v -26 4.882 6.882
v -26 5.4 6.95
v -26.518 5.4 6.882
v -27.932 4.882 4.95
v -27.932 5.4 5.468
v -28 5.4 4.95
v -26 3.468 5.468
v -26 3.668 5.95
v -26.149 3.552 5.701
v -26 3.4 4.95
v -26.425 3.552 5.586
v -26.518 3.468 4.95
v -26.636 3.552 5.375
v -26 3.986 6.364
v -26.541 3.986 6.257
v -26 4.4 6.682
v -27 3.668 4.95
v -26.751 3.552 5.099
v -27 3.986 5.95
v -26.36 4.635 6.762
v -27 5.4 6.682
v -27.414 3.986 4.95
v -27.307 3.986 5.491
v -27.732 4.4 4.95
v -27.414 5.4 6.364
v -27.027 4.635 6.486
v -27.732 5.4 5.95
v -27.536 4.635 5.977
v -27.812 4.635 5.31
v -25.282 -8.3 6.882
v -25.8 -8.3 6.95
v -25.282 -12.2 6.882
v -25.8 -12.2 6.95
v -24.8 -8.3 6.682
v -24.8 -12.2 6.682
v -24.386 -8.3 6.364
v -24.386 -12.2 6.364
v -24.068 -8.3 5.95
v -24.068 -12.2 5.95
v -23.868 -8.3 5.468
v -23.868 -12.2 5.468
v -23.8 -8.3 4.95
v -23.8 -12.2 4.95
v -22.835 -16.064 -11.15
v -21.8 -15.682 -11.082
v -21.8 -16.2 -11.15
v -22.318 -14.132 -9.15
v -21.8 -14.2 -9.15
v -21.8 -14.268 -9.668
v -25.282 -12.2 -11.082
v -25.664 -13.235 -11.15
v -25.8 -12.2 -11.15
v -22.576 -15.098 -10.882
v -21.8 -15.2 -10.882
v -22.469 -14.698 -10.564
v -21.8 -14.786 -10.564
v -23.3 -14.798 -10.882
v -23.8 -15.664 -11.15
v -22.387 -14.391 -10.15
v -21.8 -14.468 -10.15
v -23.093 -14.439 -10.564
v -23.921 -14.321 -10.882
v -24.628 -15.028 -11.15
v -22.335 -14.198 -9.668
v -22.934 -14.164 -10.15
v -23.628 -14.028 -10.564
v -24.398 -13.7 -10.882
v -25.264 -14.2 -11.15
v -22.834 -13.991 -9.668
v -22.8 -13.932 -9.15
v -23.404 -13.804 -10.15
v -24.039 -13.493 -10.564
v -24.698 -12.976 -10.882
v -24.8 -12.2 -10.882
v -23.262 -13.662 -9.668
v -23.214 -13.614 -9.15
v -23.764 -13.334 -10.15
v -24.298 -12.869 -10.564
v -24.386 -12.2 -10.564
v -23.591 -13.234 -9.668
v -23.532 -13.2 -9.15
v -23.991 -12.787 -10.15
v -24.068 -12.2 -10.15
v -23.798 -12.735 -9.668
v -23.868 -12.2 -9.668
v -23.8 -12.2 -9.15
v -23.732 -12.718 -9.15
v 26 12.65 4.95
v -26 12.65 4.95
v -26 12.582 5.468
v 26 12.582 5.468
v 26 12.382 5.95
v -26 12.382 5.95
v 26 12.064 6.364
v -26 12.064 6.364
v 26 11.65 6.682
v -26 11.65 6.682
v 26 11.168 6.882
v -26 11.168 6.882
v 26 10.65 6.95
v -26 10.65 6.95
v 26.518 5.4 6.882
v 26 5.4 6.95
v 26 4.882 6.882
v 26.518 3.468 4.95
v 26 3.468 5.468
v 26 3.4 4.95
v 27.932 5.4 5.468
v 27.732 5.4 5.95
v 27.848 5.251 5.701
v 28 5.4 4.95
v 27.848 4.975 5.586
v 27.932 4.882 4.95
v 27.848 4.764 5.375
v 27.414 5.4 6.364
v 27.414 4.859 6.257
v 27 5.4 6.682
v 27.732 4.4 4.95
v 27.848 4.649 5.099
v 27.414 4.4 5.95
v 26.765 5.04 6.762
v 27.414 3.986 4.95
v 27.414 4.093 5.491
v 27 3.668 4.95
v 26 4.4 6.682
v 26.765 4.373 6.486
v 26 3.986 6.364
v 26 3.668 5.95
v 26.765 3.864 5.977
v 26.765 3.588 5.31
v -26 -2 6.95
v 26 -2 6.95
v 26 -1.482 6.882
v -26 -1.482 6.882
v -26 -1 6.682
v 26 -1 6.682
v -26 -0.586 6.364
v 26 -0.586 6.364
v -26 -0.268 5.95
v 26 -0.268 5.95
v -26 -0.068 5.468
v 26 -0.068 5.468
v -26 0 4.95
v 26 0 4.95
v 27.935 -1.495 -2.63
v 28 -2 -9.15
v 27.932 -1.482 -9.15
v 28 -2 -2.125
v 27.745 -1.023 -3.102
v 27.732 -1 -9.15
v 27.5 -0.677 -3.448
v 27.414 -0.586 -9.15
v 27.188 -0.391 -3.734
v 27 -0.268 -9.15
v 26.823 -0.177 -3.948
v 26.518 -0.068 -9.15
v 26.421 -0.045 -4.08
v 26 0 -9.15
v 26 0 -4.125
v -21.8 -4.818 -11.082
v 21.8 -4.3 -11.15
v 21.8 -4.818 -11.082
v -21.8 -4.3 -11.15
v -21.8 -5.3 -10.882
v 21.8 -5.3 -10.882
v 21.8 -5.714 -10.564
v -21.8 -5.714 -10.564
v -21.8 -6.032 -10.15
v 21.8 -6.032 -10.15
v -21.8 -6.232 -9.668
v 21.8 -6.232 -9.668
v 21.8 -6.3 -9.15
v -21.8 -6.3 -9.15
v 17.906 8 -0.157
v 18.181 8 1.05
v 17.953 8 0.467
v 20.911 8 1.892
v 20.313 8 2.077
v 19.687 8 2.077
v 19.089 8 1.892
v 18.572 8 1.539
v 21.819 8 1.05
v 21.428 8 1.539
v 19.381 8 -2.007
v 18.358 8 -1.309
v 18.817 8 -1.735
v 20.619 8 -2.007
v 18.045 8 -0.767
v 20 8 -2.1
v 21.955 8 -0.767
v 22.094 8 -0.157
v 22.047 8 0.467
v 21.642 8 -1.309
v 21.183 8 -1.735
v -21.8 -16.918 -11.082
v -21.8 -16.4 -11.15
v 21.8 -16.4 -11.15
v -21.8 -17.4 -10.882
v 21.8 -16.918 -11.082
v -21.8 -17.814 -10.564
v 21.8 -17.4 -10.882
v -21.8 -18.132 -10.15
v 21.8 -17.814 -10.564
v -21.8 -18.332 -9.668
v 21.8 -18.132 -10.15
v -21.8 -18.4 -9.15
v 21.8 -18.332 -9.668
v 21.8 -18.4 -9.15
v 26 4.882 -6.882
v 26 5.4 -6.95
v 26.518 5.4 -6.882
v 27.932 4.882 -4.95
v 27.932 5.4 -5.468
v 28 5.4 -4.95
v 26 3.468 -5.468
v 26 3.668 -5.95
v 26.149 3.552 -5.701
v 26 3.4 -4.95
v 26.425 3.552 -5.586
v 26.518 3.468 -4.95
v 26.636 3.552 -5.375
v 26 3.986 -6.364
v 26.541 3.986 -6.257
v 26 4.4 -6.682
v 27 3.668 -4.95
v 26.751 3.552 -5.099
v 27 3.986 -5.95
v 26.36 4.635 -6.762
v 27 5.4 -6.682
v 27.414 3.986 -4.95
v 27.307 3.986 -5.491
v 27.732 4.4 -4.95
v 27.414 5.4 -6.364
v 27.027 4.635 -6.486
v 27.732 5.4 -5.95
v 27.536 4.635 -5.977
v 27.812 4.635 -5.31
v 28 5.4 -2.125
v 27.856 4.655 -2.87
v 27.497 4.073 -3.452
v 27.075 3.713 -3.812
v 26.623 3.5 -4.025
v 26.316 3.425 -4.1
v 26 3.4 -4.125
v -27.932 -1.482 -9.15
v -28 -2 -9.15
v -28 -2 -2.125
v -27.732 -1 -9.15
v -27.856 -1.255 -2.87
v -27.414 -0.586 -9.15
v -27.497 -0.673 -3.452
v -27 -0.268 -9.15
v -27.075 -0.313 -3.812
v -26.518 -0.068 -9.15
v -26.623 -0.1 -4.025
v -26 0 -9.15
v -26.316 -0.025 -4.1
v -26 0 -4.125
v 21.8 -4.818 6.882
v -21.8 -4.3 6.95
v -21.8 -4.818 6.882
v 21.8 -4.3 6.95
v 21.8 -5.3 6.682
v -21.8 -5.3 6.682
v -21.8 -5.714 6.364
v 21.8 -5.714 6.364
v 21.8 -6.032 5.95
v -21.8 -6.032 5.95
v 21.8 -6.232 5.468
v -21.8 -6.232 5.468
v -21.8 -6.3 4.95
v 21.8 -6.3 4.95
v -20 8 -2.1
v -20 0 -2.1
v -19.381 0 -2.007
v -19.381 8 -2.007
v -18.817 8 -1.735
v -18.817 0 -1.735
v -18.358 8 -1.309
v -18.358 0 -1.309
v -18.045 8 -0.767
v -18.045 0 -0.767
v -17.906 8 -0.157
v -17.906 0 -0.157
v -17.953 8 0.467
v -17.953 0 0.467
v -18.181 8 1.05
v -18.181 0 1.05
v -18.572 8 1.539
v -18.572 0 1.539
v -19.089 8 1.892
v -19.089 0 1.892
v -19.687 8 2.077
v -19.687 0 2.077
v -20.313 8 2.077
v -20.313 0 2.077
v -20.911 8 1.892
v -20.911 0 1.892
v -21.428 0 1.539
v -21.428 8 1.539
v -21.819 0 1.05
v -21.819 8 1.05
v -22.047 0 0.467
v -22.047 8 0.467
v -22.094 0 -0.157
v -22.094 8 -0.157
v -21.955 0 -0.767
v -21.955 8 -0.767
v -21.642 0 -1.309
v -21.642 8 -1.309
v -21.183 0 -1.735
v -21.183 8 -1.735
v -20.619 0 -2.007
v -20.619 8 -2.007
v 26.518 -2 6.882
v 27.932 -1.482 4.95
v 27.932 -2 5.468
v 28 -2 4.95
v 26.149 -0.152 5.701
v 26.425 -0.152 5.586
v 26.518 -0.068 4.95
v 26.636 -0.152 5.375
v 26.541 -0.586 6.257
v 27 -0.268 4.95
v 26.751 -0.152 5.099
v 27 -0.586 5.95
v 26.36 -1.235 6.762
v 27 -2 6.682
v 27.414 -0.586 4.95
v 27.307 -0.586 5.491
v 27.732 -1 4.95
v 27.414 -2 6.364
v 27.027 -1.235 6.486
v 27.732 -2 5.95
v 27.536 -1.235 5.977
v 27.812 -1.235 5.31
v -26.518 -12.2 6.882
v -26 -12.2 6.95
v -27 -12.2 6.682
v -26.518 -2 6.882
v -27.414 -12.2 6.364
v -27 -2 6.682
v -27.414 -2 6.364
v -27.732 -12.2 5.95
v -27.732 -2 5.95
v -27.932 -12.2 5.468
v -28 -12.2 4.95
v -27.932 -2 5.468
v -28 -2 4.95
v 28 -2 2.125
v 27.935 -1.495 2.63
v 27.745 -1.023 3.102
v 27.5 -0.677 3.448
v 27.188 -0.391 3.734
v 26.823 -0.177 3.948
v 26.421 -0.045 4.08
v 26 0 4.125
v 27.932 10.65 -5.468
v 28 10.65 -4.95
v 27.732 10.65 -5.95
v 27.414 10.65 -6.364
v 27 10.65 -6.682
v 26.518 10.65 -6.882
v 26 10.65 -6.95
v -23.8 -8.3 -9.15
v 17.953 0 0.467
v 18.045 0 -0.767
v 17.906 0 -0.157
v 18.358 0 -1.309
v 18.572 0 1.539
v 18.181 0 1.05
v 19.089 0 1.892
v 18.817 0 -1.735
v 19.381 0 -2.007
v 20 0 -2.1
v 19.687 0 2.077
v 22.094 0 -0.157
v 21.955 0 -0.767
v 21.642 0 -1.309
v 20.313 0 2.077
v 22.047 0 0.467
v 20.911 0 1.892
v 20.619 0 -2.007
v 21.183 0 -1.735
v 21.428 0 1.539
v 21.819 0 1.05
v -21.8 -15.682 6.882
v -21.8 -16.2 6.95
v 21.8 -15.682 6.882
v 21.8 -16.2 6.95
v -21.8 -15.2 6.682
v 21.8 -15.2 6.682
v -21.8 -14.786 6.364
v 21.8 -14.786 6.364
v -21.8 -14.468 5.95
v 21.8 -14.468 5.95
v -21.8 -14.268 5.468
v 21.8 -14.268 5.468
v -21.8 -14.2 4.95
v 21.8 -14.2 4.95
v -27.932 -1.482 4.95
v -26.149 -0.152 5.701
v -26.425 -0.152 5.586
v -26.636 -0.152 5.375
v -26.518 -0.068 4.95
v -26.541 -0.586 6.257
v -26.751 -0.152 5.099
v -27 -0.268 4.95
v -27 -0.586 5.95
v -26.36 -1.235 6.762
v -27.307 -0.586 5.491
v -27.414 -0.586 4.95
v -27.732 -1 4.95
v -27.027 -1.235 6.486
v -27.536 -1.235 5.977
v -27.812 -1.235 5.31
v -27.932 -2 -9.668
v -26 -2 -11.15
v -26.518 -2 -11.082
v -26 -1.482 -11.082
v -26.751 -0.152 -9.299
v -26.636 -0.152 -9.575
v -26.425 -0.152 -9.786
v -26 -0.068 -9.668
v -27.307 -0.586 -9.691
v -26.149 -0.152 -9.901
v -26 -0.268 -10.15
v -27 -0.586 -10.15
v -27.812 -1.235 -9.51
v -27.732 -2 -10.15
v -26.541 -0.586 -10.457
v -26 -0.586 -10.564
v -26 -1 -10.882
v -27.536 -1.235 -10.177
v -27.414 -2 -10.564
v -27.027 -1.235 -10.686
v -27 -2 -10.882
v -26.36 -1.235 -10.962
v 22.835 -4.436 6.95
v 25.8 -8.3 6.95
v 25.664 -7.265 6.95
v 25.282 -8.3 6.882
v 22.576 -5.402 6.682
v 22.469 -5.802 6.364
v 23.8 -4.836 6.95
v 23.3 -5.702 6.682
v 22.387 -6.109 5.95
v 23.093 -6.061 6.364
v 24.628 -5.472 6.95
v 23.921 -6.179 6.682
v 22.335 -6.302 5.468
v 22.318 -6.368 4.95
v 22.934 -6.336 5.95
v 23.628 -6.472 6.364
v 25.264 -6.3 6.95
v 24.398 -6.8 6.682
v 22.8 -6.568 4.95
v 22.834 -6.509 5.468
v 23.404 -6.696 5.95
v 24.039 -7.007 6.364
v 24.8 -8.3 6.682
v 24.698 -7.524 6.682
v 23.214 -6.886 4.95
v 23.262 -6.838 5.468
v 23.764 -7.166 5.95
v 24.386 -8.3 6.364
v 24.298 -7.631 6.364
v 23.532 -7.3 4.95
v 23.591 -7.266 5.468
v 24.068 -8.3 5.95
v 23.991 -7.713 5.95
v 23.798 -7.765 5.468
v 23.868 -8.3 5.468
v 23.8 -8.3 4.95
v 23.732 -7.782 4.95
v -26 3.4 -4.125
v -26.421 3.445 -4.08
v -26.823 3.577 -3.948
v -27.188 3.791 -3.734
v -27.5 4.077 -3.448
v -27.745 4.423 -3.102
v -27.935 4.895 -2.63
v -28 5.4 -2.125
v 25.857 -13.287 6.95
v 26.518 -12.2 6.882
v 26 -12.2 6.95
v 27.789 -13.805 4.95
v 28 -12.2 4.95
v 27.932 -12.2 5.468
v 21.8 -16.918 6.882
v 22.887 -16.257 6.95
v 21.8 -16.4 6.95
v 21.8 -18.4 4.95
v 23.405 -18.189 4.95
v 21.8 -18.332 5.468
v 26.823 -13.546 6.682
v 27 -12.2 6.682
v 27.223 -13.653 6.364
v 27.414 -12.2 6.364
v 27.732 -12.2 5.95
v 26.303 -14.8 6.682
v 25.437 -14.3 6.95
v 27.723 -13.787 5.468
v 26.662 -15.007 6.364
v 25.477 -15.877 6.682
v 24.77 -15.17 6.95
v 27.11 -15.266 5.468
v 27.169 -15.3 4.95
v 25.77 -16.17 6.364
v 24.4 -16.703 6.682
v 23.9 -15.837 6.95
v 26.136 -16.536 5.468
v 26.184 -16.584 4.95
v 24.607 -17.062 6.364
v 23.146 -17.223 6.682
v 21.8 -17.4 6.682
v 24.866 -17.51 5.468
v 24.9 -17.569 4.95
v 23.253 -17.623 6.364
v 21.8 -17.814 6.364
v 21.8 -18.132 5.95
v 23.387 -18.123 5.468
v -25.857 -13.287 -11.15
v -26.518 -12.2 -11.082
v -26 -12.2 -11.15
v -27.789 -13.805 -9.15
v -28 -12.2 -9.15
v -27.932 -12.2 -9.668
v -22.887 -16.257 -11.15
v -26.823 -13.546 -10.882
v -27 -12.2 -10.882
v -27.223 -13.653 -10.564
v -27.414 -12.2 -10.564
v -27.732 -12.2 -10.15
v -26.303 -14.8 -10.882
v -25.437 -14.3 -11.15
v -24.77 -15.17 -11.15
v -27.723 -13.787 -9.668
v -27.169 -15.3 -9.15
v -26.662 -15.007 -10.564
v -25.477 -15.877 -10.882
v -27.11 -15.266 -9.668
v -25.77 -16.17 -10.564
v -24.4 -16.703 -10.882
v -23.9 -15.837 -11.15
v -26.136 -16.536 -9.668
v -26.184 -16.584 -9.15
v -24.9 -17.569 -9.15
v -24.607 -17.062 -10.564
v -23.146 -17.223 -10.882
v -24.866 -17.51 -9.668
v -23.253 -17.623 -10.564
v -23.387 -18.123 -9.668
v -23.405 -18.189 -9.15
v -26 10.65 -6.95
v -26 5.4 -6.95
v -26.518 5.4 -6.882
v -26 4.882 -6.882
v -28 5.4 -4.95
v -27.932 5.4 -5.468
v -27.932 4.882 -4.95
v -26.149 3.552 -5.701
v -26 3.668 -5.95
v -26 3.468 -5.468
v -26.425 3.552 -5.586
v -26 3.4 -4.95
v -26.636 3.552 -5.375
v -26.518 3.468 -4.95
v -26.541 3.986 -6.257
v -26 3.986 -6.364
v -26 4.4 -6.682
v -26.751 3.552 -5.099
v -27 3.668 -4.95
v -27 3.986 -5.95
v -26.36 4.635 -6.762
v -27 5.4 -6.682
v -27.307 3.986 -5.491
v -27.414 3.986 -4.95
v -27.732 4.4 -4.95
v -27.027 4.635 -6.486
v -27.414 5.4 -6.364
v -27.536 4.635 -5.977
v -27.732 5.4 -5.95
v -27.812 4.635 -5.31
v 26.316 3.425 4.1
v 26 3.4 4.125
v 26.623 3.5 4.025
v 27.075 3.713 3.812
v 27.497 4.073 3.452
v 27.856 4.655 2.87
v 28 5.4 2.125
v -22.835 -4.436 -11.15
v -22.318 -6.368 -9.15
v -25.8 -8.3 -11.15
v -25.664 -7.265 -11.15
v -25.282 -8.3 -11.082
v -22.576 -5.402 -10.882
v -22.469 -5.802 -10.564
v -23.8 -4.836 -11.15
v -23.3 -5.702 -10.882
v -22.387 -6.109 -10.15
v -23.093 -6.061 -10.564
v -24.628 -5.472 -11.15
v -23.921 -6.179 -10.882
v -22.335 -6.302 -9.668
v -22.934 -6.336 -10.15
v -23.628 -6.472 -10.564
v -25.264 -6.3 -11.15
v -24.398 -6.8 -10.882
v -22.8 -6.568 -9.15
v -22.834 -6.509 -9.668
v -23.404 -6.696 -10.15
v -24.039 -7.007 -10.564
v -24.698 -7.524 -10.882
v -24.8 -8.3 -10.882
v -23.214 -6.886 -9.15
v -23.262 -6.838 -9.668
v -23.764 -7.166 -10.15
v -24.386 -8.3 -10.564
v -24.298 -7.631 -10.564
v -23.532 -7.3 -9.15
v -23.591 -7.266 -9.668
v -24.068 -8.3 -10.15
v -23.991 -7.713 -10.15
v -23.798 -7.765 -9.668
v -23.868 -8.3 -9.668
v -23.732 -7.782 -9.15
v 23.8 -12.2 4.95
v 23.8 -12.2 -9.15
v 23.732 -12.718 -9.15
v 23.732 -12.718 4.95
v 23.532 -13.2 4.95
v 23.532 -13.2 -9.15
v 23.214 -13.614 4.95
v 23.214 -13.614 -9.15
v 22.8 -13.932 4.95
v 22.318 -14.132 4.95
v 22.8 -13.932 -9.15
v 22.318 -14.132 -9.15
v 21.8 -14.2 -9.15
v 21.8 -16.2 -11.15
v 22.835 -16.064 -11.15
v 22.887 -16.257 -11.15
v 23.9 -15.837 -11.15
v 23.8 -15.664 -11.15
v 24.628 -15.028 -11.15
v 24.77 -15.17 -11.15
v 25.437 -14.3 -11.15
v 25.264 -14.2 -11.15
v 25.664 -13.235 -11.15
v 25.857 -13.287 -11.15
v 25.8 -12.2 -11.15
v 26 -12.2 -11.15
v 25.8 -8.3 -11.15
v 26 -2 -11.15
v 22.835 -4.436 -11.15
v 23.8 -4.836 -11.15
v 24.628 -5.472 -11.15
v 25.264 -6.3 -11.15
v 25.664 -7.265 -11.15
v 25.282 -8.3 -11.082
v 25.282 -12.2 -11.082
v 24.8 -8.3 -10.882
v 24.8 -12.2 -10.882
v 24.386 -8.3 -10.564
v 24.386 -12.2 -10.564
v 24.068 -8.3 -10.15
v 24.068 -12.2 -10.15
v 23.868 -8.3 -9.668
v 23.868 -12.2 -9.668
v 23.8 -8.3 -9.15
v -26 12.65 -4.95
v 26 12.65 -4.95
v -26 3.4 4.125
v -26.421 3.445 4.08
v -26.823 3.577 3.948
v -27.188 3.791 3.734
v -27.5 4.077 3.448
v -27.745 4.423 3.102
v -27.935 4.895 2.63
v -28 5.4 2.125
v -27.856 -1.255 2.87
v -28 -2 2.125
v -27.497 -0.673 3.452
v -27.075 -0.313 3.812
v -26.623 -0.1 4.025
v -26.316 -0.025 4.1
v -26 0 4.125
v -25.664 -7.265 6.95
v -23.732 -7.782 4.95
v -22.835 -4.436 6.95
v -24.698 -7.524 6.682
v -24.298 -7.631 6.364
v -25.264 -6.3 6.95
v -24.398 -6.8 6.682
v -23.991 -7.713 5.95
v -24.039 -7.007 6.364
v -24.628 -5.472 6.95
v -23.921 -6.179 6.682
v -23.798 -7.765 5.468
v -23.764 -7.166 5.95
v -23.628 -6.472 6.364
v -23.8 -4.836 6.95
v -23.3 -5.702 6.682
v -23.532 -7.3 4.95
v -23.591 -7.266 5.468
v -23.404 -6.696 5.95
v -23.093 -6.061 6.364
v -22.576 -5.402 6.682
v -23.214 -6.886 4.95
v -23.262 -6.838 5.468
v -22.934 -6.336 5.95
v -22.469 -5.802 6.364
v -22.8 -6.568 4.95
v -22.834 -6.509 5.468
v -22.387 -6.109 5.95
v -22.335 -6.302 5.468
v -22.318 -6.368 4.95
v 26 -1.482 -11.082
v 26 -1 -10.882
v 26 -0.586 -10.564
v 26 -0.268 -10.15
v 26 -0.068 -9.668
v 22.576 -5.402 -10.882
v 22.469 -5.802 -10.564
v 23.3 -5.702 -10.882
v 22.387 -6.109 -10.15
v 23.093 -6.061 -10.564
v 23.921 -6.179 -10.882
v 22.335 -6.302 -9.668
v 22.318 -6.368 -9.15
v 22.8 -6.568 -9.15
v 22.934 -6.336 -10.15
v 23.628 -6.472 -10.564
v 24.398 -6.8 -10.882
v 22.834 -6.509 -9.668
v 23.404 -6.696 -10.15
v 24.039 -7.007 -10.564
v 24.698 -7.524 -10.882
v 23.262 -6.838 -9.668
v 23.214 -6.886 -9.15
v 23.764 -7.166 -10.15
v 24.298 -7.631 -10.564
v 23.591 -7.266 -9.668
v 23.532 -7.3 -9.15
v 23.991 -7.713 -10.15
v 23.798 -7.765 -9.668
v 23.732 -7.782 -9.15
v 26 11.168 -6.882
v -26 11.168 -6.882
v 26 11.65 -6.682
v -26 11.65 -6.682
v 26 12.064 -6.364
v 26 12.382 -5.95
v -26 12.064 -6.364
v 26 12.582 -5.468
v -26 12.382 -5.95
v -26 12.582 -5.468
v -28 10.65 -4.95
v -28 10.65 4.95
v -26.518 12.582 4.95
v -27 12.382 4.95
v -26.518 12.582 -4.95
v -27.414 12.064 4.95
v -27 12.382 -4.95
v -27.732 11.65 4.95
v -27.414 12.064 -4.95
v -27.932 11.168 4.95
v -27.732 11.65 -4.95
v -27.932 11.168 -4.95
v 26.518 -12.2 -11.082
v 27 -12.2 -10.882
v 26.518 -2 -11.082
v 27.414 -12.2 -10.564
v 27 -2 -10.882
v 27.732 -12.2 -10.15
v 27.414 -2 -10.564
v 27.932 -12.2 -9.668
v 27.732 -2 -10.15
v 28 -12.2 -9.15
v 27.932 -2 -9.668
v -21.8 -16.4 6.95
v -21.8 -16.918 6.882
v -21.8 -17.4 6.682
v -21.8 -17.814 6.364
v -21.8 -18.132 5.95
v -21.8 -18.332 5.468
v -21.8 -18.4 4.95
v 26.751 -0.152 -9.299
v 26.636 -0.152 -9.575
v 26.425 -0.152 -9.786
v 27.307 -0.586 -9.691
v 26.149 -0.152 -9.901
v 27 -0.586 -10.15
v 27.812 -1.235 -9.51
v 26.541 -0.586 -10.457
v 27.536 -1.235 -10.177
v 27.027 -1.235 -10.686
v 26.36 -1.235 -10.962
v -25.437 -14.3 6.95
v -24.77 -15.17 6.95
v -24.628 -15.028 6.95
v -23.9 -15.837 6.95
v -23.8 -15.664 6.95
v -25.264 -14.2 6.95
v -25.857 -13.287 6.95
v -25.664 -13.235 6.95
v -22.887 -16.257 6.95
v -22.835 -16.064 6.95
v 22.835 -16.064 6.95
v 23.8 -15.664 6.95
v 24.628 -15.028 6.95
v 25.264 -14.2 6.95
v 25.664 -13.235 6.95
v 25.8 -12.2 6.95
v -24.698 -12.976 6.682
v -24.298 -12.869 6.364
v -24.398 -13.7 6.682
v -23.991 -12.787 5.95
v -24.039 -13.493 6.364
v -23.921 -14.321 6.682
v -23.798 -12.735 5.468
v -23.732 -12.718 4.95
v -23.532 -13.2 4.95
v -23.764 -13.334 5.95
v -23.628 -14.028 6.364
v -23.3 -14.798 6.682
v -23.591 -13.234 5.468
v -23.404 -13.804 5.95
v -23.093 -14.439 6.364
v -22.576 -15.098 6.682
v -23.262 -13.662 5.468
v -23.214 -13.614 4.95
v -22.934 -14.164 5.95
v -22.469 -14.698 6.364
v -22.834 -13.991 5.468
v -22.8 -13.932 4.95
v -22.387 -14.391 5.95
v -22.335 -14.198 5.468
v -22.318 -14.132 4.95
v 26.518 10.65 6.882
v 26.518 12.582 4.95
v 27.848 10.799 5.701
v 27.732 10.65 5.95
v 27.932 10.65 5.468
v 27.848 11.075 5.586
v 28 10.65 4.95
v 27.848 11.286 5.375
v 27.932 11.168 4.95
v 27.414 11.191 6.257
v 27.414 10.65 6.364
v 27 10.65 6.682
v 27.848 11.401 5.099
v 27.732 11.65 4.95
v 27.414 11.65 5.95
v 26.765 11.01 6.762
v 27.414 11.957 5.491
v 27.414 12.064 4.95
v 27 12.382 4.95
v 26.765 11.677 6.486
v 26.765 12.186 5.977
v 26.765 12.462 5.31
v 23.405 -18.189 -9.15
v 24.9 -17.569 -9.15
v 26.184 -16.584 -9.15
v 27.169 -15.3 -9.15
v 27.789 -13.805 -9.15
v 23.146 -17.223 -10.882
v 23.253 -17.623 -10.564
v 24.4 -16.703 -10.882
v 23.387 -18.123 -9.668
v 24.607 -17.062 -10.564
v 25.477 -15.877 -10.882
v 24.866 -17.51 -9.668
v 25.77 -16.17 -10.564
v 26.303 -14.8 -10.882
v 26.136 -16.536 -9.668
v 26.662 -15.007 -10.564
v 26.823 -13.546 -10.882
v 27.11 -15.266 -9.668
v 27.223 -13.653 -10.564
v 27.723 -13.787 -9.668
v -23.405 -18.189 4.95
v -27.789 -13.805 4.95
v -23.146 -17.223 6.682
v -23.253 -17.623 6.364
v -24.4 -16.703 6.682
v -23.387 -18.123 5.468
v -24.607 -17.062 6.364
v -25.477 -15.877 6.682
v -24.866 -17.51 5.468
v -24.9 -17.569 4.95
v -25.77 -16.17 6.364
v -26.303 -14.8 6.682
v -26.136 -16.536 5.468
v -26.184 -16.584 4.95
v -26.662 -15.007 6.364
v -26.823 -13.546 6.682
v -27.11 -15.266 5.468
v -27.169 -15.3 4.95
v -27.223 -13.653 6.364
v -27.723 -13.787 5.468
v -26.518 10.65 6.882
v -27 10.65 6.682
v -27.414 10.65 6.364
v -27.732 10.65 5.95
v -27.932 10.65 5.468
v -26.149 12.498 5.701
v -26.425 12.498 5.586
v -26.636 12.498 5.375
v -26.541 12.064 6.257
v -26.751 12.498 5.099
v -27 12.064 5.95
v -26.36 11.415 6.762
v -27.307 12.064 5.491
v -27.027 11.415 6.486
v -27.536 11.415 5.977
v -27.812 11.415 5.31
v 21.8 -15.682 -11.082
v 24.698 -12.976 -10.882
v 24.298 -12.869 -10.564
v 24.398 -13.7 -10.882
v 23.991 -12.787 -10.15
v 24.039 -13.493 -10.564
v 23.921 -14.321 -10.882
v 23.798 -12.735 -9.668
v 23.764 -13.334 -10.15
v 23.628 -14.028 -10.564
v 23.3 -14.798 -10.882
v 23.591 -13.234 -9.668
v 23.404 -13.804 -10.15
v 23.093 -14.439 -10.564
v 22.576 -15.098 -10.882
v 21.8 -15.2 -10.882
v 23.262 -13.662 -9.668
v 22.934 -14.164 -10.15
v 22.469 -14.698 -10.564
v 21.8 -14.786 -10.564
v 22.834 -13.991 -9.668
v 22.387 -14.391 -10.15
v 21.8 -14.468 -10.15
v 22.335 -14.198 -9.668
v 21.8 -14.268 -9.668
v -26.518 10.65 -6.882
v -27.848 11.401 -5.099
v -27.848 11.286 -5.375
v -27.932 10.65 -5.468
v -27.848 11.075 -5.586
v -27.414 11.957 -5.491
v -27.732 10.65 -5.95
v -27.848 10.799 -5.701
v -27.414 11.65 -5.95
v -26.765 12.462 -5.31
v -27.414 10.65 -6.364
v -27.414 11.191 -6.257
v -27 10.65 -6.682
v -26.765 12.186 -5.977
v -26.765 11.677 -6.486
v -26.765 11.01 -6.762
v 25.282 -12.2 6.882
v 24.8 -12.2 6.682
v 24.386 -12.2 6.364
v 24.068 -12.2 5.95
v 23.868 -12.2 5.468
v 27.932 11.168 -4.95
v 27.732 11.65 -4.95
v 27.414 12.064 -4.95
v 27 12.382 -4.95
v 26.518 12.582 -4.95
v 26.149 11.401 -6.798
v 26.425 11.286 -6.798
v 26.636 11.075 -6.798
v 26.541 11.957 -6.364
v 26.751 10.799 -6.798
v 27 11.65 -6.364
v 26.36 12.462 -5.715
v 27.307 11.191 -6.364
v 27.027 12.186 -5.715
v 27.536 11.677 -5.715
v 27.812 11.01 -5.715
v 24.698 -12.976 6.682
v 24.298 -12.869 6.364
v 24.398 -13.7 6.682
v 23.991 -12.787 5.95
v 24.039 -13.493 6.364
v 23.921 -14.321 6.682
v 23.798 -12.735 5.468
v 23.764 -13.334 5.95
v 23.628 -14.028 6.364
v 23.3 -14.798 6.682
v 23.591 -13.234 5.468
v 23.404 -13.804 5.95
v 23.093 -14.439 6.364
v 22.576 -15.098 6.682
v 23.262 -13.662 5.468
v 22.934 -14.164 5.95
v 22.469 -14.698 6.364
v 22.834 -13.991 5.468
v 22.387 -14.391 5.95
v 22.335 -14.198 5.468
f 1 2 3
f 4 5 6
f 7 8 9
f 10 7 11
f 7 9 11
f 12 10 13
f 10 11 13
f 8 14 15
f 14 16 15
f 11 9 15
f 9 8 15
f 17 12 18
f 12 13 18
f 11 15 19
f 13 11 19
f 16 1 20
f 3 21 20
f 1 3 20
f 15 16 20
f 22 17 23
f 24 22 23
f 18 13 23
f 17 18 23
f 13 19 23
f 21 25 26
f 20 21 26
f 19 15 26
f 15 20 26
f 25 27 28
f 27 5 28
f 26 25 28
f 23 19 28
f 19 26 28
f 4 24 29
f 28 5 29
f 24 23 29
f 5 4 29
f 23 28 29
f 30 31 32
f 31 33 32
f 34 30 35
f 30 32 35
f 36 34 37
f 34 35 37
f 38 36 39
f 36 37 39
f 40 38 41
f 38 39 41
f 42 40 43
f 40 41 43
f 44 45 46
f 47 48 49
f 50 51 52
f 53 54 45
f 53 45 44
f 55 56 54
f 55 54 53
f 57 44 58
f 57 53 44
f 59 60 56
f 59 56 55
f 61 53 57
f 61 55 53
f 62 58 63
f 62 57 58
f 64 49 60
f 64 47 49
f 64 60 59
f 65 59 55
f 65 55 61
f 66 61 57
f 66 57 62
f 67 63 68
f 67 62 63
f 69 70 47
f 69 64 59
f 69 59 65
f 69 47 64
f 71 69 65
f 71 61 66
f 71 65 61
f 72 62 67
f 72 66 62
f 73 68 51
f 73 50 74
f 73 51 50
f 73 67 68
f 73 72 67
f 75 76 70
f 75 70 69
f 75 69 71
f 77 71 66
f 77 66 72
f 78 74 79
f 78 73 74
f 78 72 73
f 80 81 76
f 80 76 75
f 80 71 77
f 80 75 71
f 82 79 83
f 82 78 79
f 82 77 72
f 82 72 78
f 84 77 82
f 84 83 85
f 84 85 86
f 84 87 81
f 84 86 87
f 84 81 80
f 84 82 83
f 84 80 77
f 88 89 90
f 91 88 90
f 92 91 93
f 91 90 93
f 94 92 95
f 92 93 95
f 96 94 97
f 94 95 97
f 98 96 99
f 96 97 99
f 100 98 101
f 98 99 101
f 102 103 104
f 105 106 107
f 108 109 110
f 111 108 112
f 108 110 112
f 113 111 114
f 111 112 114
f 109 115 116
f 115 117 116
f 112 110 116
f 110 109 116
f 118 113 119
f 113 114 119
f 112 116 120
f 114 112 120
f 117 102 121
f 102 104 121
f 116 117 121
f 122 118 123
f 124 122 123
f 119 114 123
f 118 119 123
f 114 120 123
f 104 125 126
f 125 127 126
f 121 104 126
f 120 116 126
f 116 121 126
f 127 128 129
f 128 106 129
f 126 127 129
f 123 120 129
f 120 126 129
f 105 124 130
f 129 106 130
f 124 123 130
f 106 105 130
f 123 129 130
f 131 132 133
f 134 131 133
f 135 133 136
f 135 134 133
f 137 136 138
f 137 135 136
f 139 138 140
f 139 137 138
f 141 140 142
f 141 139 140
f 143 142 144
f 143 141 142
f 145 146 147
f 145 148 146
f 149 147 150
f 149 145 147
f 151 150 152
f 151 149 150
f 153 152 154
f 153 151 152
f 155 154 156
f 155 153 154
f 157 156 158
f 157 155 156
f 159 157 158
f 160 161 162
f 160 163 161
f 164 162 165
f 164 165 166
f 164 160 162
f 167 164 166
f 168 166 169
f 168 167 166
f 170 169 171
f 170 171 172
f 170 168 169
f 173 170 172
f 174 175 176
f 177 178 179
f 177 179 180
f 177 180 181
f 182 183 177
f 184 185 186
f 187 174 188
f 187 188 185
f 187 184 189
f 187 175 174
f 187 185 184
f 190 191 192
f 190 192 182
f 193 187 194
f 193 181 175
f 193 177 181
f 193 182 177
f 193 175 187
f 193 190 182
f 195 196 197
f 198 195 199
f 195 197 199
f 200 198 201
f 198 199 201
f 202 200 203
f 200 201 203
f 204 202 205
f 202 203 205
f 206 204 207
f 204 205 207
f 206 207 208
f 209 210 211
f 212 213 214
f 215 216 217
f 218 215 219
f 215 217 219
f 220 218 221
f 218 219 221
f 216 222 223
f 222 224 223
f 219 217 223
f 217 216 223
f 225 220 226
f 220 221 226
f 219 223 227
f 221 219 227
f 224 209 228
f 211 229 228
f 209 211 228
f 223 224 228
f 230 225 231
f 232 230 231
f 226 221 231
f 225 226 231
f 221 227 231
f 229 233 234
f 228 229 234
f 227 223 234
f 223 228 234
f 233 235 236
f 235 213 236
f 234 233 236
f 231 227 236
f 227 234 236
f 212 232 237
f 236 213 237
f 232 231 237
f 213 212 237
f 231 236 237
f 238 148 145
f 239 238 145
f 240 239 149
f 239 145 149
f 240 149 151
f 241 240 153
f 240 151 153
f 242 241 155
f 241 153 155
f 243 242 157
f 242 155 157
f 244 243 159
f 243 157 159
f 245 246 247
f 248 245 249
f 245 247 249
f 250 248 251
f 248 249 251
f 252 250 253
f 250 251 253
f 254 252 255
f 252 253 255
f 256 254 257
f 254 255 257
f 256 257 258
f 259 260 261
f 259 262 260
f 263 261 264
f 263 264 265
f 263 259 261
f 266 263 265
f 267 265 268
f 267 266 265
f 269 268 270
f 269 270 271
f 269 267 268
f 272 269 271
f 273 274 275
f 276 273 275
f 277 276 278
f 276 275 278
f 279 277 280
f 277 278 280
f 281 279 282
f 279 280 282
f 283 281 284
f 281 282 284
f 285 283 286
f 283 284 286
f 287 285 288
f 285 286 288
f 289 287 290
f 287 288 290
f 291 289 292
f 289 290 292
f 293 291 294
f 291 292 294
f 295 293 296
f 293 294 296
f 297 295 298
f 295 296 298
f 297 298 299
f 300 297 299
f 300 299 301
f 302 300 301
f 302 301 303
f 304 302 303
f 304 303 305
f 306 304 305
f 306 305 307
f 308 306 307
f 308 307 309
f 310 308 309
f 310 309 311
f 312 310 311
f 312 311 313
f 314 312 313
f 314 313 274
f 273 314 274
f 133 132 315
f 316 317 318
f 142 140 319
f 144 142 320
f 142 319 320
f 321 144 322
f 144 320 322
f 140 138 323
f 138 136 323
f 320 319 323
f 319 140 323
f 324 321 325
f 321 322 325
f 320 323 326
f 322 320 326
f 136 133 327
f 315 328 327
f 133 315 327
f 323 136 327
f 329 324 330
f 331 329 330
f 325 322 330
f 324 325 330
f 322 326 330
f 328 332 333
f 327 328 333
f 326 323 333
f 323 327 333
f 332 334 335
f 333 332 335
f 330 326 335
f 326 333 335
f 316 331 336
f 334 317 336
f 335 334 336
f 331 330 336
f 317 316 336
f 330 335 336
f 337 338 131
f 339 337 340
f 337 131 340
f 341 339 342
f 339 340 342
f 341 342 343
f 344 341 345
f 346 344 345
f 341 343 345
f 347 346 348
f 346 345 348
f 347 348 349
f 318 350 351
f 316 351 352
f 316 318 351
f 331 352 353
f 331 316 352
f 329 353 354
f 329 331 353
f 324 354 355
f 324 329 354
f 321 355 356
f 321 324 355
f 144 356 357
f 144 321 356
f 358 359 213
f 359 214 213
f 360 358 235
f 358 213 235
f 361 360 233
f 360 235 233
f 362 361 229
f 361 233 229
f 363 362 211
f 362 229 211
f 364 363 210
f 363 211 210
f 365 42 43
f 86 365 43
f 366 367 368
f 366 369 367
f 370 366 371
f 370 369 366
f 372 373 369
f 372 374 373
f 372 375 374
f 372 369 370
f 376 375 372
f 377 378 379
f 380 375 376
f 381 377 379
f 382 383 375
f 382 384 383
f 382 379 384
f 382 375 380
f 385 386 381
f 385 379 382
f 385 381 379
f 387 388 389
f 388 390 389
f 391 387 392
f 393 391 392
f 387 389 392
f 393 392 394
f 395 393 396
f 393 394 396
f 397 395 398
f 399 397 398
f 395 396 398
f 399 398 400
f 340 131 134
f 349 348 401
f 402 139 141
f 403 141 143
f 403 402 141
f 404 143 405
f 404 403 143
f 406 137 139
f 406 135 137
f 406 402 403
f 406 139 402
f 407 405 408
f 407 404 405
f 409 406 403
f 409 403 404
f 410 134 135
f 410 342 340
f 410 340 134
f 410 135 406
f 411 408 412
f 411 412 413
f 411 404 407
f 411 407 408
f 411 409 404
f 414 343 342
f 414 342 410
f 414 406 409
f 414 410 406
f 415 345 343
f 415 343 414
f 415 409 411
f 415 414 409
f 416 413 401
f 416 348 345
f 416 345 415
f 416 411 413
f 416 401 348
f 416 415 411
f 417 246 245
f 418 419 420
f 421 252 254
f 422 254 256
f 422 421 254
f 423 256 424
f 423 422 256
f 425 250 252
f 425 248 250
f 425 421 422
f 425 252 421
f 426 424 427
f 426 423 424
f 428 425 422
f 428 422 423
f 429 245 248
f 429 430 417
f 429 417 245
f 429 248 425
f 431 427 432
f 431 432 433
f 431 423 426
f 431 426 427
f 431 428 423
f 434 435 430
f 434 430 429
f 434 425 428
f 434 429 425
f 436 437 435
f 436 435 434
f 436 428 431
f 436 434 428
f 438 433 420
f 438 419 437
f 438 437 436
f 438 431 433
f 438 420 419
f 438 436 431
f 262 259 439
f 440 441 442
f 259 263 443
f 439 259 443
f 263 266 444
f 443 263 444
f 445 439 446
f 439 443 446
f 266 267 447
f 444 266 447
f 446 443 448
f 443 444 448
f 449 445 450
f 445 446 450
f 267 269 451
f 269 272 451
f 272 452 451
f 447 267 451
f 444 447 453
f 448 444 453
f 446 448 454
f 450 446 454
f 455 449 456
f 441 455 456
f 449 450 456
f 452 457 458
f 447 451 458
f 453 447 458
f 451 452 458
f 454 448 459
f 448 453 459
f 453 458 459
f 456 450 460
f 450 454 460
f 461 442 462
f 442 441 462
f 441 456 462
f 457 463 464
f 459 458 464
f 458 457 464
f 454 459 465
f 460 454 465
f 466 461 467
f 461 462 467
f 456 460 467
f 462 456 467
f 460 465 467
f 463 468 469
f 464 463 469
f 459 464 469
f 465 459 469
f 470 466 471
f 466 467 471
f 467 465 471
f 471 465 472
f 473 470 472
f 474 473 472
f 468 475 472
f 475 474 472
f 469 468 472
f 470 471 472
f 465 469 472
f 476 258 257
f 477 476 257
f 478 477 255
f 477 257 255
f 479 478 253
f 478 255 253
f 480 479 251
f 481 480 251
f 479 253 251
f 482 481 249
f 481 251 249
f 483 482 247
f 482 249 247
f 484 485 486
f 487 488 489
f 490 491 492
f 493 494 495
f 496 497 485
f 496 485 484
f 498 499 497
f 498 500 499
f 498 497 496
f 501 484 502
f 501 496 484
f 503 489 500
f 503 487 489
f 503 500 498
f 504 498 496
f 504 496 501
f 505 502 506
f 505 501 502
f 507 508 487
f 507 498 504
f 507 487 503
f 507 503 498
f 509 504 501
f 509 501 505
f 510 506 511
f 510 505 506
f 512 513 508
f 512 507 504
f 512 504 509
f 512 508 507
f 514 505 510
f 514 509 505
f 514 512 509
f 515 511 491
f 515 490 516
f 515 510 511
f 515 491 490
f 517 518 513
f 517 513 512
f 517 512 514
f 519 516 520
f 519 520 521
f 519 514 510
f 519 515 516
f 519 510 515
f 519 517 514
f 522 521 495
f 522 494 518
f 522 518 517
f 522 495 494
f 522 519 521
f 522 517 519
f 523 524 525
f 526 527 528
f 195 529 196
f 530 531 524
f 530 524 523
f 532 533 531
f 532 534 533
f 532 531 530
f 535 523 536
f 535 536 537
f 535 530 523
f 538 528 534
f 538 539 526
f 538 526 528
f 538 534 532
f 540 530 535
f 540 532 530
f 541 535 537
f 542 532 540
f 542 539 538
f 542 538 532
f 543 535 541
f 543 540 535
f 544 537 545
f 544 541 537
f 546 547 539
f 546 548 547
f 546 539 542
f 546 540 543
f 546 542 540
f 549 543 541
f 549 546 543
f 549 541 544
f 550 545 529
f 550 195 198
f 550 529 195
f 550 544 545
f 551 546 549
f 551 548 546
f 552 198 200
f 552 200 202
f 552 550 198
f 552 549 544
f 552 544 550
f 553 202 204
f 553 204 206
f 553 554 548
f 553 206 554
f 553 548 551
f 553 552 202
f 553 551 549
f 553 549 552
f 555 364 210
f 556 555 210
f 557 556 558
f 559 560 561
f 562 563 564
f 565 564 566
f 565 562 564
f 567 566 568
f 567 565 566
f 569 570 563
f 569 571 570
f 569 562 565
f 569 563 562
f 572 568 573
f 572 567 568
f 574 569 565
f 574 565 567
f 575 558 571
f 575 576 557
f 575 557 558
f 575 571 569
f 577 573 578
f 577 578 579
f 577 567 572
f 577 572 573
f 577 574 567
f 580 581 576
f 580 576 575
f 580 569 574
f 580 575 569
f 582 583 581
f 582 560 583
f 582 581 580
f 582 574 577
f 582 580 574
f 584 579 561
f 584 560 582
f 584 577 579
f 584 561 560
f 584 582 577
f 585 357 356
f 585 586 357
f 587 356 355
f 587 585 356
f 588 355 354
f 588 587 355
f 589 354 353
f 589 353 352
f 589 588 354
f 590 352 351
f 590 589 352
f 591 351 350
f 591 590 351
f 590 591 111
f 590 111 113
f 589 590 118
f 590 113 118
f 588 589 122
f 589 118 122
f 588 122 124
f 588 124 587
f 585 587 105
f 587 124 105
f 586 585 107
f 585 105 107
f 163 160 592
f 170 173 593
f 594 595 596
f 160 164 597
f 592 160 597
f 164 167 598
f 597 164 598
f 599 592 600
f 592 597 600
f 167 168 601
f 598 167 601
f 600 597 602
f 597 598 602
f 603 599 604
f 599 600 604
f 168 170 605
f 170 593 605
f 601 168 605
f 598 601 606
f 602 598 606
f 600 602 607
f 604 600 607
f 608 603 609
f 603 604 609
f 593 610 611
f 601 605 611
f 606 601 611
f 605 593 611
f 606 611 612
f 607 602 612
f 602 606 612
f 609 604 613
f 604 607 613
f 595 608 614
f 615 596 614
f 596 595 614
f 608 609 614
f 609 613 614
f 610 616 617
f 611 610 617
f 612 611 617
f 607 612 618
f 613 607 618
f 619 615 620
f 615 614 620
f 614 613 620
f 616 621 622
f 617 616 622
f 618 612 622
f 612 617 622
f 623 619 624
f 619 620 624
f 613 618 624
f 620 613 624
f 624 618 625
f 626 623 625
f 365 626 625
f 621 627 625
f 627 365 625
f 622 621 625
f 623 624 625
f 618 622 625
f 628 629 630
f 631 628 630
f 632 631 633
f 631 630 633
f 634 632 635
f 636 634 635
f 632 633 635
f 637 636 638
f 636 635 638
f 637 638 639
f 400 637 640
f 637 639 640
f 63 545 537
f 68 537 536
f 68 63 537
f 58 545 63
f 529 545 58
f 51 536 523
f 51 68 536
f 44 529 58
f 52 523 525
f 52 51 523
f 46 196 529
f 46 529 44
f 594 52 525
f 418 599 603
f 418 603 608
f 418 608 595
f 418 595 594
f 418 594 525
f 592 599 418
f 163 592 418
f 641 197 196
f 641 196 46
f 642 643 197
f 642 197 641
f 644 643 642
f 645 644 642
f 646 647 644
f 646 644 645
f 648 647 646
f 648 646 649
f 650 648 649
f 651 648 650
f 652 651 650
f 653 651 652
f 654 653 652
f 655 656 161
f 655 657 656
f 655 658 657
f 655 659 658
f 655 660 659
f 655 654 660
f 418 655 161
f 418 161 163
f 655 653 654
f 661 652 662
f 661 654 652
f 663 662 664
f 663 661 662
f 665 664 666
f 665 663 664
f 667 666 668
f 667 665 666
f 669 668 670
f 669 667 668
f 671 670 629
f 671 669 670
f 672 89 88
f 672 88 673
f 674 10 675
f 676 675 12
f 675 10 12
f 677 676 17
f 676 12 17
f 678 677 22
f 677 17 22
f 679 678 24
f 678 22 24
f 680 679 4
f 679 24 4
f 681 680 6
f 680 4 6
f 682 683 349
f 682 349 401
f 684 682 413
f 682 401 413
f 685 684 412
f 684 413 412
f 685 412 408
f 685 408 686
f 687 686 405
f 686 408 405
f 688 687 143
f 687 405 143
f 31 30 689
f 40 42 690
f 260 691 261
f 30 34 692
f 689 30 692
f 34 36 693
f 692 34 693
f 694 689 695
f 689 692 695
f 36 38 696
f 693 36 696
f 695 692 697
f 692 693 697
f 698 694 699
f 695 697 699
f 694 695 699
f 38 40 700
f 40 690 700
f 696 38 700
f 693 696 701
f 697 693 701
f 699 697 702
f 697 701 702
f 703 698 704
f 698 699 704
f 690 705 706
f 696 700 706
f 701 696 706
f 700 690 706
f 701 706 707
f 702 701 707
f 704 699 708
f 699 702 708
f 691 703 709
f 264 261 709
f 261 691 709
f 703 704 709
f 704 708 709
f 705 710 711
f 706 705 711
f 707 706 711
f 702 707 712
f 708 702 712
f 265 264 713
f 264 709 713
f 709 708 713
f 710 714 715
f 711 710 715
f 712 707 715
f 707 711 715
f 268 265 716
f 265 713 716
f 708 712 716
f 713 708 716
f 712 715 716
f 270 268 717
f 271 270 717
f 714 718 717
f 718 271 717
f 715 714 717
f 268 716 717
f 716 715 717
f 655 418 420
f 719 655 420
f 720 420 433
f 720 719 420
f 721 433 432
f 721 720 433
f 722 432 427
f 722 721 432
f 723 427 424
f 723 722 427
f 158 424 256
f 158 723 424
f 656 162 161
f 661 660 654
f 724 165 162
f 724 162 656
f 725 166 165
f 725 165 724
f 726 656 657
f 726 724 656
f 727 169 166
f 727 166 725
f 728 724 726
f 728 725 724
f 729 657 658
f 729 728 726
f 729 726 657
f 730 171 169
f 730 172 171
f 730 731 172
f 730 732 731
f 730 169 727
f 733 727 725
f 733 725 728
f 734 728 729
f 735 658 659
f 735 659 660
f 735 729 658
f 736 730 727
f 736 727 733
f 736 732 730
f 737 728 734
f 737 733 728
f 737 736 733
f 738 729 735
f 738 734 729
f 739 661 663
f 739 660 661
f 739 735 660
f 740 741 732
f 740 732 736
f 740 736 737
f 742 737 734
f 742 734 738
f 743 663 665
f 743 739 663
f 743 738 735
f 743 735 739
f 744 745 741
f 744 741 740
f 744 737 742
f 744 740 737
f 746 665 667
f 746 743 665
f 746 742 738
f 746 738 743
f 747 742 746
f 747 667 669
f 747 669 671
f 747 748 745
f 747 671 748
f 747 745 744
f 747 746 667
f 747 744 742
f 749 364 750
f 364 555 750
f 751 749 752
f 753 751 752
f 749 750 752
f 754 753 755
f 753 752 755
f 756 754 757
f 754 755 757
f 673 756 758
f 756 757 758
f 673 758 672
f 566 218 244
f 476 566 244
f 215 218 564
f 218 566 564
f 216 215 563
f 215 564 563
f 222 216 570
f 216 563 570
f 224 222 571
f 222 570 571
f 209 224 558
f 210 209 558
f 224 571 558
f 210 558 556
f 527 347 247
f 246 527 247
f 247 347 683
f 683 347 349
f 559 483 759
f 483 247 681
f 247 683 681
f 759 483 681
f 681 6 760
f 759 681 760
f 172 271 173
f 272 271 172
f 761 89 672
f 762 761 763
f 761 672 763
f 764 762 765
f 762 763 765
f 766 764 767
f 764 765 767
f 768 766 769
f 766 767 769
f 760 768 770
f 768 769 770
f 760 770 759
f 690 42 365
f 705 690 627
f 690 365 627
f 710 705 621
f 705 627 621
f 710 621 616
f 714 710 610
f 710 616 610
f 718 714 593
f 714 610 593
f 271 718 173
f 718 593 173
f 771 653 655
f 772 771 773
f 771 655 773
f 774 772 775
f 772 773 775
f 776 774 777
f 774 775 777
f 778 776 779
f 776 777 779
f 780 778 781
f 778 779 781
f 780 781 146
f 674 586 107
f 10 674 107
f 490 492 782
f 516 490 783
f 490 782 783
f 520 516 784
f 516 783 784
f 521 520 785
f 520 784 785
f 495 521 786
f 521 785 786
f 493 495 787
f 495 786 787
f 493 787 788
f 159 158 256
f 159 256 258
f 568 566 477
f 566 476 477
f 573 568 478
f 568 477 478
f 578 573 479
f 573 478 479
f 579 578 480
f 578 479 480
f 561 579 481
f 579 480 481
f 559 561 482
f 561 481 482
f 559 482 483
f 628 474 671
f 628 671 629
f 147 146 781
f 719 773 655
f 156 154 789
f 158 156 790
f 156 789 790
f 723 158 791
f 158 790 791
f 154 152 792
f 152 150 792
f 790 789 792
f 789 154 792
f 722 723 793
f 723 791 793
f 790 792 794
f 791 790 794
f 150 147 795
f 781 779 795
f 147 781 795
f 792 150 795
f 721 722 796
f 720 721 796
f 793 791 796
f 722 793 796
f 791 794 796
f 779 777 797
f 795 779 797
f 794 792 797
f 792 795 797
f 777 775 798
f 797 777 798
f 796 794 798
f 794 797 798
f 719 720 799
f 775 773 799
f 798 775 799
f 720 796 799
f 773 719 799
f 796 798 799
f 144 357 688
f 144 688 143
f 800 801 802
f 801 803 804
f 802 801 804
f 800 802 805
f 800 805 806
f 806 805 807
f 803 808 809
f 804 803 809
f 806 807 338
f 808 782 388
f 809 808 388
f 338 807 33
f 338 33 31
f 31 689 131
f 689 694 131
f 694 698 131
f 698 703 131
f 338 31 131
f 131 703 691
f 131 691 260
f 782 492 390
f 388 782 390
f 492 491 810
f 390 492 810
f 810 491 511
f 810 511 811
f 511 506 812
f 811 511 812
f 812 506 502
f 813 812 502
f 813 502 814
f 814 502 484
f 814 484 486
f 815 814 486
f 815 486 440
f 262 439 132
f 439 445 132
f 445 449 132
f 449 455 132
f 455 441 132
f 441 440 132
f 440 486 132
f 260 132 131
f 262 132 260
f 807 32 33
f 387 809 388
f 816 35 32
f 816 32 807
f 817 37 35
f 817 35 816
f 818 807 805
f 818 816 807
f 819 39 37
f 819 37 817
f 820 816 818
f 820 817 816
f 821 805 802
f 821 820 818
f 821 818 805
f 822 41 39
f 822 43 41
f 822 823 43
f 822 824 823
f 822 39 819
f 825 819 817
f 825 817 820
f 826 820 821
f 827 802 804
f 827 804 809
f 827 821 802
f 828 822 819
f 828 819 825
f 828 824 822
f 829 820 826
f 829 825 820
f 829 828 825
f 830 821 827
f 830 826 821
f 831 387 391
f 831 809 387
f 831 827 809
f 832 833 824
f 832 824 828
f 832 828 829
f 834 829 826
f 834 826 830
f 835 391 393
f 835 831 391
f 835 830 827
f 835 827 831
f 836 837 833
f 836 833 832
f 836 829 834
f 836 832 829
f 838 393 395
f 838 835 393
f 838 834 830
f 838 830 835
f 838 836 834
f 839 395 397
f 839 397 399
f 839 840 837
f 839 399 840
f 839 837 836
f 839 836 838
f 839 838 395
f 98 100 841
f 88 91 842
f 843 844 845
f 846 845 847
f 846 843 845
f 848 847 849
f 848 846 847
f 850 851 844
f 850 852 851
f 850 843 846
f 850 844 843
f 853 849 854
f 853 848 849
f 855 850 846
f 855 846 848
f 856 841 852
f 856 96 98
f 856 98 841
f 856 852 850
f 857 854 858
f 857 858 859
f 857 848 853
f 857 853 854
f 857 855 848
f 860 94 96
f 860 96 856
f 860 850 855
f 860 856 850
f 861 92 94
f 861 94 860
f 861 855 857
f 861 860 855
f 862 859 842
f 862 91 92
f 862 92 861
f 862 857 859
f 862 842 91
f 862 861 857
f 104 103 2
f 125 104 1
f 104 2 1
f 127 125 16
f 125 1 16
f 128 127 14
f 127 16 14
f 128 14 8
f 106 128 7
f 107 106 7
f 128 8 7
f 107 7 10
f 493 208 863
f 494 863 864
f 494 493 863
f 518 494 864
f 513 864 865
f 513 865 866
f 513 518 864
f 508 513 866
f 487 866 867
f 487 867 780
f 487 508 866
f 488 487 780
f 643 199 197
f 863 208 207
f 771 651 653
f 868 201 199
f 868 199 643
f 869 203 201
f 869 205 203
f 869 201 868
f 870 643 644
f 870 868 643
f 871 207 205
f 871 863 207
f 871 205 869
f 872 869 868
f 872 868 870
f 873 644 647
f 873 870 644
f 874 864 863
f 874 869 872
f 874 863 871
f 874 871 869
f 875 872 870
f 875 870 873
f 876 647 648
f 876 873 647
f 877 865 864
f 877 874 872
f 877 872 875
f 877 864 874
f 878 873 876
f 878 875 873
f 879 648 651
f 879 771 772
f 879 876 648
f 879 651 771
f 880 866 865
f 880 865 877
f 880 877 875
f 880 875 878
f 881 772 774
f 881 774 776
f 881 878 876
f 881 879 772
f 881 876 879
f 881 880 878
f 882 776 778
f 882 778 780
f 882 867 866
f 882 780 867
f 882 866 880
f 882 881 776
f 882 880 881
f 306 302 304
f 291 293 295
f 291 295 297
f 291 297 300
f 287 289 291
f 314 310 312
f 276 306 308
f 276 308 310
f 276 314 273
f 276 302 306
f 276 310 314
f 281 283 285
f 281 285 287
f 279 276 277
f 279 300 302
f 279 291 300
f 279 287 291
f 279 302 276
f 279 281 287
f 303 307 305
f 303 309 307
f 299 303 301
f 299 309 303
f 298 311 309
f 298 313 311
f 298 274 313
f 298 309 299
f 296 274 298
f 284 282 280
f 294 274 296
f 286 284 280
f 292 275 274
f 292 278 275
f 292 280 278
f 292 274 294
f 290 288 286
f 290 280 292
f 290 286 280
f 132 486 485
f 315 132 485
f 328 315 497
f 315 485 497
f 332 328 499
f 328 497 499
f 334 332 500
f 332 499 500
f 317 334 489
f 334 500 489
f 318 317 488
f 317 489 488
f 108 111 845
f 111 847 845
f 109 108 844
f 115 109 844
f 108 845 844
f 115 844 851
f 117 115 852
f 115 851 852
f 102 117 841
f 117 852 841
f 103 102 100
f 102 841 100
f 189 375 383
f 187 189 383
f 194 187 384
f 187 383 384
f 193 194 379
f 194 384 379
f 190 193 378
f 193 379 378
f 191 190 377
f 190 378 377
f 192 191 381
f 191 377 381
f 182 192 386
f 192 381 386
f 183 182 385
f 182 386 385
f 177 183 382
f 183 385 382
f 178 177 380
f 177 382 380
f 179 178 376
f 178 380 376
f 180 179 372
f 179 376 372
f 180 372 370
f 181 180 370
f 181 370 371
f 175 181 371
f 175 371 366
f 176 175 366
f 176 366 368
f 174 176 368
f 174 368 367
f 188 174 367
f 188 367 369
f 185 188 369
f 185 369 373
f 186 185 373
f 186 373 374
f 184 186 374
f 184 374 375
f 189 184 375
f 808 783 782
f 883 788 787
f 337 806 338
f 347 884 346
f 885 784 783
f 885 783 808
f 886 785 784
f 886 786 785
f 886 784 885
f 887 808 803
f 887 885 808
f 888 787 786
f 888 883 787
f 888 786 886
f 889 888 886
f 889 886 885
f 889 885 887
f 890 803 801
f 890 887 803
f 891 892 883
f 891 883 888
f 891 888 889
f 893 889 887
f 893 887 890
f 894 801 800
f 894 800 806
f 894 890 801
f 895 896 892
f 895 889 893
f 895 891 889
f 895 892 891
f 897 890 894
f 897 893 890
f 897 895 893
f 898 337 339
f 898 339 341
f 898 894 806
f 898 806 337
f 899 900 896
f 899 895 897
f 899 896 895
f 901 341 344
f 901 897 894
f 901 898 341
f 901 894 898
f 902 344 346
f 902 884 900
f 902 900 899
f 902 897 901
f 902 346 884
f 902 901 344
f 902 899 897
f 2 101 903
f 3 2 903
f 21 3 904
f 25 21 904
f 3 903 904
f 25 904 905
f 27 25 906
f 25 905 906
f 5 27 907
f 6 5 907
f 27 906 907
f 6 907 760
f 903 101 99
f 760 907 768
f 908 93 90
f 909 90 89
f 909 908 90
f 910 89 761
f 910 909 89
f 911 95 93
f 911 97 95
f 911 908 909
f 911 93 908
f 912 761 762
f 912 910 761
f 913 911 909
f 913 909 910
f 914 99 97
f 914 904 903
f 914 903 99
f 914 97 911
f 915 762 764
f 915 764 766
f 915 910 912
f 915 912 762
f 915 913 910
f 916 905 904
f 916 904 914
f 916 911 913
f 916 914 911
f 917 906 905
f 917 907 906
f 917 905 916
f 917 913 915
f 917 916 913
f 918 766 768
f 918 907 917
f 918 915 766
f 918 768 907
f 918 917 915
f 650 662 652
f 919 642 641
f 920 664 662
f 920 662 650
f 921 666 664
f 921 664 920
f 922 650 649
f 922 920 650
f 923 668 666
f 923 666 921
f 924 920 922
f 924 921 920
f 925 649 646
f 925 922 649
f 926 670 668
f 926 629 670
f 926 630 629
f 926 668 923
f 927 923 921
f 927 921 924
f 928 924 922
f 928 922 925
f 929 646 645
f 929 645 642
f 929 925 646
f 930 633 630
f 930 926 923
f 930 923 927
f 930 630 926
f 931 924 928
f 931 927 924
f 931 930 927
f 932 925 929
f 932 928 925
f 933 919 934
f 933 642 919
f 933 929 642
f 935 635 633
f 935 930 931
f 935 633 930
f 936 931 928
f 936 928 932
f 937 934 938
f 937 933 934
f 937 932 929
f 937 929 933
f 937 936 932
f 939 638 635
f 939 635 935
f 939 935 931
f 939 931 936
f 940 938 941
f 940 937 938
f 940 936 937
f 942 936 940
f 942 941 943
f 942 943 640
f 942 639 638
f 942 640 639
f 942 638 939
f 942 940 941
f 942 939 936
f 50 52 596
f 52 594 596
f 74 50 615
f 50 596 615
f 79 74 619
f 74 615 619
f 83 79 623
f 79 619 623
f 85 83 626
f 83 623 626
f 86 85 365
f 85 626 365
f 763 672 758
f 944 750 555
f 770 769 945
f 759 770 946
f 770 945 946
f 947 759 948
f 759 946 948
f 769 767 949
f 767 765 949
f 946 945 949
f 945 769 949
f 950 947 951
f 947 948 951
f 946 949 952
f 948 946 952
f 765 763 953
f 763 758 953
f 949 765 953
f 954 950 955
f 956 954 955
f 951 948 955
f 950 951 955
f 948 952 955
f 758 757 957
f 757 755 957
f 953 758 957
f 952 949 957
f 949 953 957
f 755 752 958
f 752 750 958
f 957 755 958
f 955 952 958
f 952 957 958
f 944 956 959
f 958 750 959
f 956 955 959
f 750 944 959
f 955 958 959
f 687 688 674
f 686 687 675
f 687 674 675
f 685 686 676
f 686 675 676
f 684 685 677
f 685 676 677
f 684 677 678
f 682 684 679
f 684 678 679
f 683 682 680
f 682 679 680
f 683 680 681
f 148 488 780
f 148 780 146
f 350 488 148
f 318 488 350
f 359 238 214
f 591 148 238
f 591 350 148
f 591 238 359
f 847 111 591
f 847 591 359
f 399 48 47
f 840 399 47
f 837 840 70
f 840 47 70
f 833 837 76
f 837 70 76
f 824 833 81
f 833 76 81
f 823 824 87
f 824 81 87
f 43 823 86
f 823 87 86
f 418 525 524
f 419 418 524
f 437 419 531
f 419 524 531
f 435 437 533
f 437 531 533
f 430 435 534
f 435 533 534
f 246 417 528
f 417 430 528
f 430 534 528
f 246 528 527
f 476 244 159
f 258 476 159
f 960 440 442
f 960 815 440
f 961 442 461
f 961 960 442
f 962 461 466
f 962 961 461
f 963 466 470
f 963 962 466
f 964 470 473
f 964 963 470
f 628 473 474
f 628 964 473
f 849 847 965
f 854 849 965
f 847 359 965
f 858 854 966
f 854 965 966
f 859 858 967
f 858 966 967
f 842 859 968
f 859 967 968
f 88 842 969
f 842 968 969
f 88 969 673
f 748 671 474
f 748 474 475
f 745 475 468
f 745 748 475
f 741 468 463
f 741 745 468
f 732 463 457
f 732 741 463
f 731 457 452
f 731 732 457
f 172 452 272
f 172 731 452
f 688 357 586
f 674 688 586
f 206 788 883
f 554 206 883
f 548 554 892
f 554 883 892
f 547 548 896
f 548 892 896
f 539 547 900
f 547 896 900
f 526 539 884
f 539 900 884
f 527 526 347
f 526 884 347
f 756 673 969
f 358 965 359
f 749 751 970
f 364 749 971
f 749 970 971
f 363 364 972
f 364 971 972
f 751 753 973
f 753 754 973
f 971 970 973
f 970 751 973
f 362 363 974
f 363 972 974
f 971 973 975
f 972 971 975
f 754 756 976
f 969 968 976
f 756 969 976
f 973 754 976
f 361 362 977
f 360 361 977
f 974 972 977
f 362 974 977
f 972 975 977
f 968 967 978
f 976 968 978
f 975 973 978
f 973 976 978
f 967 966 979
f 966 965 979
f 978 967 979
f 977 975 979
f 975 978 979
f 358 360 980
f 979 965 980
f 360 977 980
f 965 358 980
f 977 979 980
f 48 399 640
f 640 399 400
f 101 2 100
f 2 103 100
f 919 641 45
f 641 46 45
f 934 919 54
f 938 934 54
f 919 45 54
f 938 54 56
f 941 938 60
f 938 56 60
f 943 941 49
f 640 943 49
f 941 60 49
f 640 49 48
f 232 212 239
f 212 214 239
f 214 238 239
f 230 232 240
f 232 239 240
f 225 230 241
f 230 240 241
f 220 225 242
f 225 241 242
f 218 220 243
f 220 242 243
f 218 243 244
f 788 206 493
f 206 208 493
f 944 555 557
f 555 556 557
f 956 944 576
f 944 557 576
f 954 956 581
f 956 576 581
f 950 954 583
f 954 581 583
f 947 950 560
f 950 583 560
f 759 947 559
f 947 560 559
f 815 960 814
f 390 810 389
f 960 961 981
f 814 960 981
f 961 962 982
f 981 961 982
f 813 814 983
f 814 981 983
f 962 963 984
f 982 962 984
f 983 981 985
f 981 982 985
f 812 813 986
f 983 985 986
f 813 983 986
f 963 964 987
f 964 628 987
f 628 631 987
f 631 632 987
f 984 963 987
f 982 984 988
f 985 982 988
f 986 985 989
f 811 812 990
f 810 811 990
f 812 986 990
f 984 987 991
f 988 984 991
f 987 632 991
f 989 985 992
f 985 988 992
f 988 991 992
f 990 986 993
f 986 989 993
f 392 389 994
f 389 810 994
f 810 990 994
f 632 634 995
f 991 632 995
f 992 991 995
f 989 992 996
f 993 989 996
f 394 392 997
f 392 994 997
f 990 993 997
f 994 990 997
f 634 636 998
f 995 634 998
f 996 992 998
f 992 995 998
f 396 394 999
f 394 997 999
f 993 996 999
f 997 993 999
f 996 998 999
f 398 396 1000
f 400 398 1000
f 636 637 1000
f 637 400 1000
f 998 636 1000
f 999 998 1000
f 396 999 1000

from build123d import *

# Parameters (mm, degrees)
SKETCH001_W     = 18.4
SKETCH001_H     = 18.1
PAD001_DEPTH    = 28
SKETCH002_W     = 7.9
SKETCH002_H     = 47.6
POCKET_DEPTH    = 18.101
FILLET001_R     = 6.2
FILLET002_R     = 2
PAD_DEPTH       = 28
FILLET_R        = 2
SKETCH003_R     = 2.1
POCKET001_DEPTH = 10


with BuildPart() as socketbody:
    # Sketch001 → Pad001 (new body, symmetric)
    with BuildSketch(Plane.YZ):
        with Locations((-9.2, -2.1)):
            Rectangle(SKETCH001_W, SKETCH001_H)
    extrude(amount=PAD001_DEPTH, both=True)

    # Sketch002 (on Face1 of Pad001) → Pocket (cut, through all)
    with BuildSketch(Plane(origin=(0, 0, 6.95), x_dir=(0, -1, 0), z_dir=(0, 0, 1))):
        with Locations((10.25, 0)):
            Rectangle(SKETCH002_W, SKETCH002_H)
    extrude(amount=-POCKET_DEPTH, mode=Mode.SUBTRACT)

    # Fillet001
    fillet001_edges = [socketbody.edges().sort_by_distance(p)[0] for p in [
        (28, -18.4, -2.1),
        (-28, -18.4, -2.1),
    ]]
    fillet(fillet001_edges, radius=FILLET001_R)

    # Fillet002
    fillet002_edges = [socketbody.edges().sort_by_distance(p)[0] for p in [
        (-23.8, -10.25, 6.95),
        (0, -6.3, 6.95),
        (23.8, -10.25, 6.95),
        (0, -14.2, 6.95),
        (-23.8, -6.3, -2.1),
        (-28, -6.1, 6.95),
        (-26.184062, -16.584062, 6.95),
        (0, -18.4, 6.95),
        (26.184062, -16.584062, 6.95),
        (28, -6.1, 6.95),
        (0, 0, 6.95),
        (28, -6.1, -11.15),
        (26.184062, -16.584062, -11.15),
        (0, -18.4, -11.15),
        (-26.184062, -16.584062, -11.15),
        (28, 0, -2.1),
        (-28, 0, -2.1),
        (-28, -6.1, -11.15),
        (0, 0, -11.15),
        (0, -6.3, -11.15),
        (23.8, -10.25, -11.15),
        (0, -14.2, -11.15),
        (23.8, -14.2, -2.1),
        (-23.8, -10.25, -11.15),
        (-23.8, -14.2, -2.1),
        (23.8, -6.3, -2.1),
    ]]
    fillet(fillet002_edges, radius=FILLET002_R)


with BuildPart() as socketandrailbody:
    # Sketch → Pad (new body, symmetric)
    with BuildSketch(Plane.YZ):
        Polygon((-2, 4.125), (3.4, 4.125), (3.4, 6.95), (12.65, 6.95), (12.65, -6.95), (3.4, -6.95), (3.4, -4.125), (-2, -4.125), align=None)
    extrude(amount=PAD_DEPTH, both=True)

    # Fillet
    fillet_edges = [socketandrailbody.edges().sort_by_distance(p)[0] for p in [
        (-28, 8.025, 6.95),
        (0, 3.4, 6.95),
        (0, 12.65, 6.95),
        (28, 8.025, 6.95),
        (28, 12.65, 0),
        (0, 12.65, -6.95),
        (-28, 12.65, 0),
        (-28, 8.025, -6.95),
        (28, 8.025, -6.95),
        (0, 3.4, -6.95),
        (28, 3.4, -5.5375),
        (28, 3.4, 5.5375),
        (-28, 3.4, -5.5375),
        (-28, 0.7, -4.125),
        (28, 0.7, -4.125),
        (28, 0.7, 4.125),
        (-28, 0.7, 4.125),
        (-28, 3.4, 5.5375),
    ]]
    fillet(fillet_edges, radius=FILLET_R)

    # Sketch003 (on Face2 of Fillet) → Pocket001 (cut)
    with BuildSketch(Plane(origin=(0, -2, 0), x_dir=(0, 0, -1), z_dir=(0, -1, 0))):
        with Locations((0, 20)):
            Circle(SKETCH003_R)
        with Locations((0, -20)):
            Circle(SKETCH003_R)
    extrude(amount=-POCKET001_DEPTH, mode=Mode.SUBTRACT)

    # Fusion: union SocketBody
    add(socketbody.part)


solid = socketandrailbody.part
